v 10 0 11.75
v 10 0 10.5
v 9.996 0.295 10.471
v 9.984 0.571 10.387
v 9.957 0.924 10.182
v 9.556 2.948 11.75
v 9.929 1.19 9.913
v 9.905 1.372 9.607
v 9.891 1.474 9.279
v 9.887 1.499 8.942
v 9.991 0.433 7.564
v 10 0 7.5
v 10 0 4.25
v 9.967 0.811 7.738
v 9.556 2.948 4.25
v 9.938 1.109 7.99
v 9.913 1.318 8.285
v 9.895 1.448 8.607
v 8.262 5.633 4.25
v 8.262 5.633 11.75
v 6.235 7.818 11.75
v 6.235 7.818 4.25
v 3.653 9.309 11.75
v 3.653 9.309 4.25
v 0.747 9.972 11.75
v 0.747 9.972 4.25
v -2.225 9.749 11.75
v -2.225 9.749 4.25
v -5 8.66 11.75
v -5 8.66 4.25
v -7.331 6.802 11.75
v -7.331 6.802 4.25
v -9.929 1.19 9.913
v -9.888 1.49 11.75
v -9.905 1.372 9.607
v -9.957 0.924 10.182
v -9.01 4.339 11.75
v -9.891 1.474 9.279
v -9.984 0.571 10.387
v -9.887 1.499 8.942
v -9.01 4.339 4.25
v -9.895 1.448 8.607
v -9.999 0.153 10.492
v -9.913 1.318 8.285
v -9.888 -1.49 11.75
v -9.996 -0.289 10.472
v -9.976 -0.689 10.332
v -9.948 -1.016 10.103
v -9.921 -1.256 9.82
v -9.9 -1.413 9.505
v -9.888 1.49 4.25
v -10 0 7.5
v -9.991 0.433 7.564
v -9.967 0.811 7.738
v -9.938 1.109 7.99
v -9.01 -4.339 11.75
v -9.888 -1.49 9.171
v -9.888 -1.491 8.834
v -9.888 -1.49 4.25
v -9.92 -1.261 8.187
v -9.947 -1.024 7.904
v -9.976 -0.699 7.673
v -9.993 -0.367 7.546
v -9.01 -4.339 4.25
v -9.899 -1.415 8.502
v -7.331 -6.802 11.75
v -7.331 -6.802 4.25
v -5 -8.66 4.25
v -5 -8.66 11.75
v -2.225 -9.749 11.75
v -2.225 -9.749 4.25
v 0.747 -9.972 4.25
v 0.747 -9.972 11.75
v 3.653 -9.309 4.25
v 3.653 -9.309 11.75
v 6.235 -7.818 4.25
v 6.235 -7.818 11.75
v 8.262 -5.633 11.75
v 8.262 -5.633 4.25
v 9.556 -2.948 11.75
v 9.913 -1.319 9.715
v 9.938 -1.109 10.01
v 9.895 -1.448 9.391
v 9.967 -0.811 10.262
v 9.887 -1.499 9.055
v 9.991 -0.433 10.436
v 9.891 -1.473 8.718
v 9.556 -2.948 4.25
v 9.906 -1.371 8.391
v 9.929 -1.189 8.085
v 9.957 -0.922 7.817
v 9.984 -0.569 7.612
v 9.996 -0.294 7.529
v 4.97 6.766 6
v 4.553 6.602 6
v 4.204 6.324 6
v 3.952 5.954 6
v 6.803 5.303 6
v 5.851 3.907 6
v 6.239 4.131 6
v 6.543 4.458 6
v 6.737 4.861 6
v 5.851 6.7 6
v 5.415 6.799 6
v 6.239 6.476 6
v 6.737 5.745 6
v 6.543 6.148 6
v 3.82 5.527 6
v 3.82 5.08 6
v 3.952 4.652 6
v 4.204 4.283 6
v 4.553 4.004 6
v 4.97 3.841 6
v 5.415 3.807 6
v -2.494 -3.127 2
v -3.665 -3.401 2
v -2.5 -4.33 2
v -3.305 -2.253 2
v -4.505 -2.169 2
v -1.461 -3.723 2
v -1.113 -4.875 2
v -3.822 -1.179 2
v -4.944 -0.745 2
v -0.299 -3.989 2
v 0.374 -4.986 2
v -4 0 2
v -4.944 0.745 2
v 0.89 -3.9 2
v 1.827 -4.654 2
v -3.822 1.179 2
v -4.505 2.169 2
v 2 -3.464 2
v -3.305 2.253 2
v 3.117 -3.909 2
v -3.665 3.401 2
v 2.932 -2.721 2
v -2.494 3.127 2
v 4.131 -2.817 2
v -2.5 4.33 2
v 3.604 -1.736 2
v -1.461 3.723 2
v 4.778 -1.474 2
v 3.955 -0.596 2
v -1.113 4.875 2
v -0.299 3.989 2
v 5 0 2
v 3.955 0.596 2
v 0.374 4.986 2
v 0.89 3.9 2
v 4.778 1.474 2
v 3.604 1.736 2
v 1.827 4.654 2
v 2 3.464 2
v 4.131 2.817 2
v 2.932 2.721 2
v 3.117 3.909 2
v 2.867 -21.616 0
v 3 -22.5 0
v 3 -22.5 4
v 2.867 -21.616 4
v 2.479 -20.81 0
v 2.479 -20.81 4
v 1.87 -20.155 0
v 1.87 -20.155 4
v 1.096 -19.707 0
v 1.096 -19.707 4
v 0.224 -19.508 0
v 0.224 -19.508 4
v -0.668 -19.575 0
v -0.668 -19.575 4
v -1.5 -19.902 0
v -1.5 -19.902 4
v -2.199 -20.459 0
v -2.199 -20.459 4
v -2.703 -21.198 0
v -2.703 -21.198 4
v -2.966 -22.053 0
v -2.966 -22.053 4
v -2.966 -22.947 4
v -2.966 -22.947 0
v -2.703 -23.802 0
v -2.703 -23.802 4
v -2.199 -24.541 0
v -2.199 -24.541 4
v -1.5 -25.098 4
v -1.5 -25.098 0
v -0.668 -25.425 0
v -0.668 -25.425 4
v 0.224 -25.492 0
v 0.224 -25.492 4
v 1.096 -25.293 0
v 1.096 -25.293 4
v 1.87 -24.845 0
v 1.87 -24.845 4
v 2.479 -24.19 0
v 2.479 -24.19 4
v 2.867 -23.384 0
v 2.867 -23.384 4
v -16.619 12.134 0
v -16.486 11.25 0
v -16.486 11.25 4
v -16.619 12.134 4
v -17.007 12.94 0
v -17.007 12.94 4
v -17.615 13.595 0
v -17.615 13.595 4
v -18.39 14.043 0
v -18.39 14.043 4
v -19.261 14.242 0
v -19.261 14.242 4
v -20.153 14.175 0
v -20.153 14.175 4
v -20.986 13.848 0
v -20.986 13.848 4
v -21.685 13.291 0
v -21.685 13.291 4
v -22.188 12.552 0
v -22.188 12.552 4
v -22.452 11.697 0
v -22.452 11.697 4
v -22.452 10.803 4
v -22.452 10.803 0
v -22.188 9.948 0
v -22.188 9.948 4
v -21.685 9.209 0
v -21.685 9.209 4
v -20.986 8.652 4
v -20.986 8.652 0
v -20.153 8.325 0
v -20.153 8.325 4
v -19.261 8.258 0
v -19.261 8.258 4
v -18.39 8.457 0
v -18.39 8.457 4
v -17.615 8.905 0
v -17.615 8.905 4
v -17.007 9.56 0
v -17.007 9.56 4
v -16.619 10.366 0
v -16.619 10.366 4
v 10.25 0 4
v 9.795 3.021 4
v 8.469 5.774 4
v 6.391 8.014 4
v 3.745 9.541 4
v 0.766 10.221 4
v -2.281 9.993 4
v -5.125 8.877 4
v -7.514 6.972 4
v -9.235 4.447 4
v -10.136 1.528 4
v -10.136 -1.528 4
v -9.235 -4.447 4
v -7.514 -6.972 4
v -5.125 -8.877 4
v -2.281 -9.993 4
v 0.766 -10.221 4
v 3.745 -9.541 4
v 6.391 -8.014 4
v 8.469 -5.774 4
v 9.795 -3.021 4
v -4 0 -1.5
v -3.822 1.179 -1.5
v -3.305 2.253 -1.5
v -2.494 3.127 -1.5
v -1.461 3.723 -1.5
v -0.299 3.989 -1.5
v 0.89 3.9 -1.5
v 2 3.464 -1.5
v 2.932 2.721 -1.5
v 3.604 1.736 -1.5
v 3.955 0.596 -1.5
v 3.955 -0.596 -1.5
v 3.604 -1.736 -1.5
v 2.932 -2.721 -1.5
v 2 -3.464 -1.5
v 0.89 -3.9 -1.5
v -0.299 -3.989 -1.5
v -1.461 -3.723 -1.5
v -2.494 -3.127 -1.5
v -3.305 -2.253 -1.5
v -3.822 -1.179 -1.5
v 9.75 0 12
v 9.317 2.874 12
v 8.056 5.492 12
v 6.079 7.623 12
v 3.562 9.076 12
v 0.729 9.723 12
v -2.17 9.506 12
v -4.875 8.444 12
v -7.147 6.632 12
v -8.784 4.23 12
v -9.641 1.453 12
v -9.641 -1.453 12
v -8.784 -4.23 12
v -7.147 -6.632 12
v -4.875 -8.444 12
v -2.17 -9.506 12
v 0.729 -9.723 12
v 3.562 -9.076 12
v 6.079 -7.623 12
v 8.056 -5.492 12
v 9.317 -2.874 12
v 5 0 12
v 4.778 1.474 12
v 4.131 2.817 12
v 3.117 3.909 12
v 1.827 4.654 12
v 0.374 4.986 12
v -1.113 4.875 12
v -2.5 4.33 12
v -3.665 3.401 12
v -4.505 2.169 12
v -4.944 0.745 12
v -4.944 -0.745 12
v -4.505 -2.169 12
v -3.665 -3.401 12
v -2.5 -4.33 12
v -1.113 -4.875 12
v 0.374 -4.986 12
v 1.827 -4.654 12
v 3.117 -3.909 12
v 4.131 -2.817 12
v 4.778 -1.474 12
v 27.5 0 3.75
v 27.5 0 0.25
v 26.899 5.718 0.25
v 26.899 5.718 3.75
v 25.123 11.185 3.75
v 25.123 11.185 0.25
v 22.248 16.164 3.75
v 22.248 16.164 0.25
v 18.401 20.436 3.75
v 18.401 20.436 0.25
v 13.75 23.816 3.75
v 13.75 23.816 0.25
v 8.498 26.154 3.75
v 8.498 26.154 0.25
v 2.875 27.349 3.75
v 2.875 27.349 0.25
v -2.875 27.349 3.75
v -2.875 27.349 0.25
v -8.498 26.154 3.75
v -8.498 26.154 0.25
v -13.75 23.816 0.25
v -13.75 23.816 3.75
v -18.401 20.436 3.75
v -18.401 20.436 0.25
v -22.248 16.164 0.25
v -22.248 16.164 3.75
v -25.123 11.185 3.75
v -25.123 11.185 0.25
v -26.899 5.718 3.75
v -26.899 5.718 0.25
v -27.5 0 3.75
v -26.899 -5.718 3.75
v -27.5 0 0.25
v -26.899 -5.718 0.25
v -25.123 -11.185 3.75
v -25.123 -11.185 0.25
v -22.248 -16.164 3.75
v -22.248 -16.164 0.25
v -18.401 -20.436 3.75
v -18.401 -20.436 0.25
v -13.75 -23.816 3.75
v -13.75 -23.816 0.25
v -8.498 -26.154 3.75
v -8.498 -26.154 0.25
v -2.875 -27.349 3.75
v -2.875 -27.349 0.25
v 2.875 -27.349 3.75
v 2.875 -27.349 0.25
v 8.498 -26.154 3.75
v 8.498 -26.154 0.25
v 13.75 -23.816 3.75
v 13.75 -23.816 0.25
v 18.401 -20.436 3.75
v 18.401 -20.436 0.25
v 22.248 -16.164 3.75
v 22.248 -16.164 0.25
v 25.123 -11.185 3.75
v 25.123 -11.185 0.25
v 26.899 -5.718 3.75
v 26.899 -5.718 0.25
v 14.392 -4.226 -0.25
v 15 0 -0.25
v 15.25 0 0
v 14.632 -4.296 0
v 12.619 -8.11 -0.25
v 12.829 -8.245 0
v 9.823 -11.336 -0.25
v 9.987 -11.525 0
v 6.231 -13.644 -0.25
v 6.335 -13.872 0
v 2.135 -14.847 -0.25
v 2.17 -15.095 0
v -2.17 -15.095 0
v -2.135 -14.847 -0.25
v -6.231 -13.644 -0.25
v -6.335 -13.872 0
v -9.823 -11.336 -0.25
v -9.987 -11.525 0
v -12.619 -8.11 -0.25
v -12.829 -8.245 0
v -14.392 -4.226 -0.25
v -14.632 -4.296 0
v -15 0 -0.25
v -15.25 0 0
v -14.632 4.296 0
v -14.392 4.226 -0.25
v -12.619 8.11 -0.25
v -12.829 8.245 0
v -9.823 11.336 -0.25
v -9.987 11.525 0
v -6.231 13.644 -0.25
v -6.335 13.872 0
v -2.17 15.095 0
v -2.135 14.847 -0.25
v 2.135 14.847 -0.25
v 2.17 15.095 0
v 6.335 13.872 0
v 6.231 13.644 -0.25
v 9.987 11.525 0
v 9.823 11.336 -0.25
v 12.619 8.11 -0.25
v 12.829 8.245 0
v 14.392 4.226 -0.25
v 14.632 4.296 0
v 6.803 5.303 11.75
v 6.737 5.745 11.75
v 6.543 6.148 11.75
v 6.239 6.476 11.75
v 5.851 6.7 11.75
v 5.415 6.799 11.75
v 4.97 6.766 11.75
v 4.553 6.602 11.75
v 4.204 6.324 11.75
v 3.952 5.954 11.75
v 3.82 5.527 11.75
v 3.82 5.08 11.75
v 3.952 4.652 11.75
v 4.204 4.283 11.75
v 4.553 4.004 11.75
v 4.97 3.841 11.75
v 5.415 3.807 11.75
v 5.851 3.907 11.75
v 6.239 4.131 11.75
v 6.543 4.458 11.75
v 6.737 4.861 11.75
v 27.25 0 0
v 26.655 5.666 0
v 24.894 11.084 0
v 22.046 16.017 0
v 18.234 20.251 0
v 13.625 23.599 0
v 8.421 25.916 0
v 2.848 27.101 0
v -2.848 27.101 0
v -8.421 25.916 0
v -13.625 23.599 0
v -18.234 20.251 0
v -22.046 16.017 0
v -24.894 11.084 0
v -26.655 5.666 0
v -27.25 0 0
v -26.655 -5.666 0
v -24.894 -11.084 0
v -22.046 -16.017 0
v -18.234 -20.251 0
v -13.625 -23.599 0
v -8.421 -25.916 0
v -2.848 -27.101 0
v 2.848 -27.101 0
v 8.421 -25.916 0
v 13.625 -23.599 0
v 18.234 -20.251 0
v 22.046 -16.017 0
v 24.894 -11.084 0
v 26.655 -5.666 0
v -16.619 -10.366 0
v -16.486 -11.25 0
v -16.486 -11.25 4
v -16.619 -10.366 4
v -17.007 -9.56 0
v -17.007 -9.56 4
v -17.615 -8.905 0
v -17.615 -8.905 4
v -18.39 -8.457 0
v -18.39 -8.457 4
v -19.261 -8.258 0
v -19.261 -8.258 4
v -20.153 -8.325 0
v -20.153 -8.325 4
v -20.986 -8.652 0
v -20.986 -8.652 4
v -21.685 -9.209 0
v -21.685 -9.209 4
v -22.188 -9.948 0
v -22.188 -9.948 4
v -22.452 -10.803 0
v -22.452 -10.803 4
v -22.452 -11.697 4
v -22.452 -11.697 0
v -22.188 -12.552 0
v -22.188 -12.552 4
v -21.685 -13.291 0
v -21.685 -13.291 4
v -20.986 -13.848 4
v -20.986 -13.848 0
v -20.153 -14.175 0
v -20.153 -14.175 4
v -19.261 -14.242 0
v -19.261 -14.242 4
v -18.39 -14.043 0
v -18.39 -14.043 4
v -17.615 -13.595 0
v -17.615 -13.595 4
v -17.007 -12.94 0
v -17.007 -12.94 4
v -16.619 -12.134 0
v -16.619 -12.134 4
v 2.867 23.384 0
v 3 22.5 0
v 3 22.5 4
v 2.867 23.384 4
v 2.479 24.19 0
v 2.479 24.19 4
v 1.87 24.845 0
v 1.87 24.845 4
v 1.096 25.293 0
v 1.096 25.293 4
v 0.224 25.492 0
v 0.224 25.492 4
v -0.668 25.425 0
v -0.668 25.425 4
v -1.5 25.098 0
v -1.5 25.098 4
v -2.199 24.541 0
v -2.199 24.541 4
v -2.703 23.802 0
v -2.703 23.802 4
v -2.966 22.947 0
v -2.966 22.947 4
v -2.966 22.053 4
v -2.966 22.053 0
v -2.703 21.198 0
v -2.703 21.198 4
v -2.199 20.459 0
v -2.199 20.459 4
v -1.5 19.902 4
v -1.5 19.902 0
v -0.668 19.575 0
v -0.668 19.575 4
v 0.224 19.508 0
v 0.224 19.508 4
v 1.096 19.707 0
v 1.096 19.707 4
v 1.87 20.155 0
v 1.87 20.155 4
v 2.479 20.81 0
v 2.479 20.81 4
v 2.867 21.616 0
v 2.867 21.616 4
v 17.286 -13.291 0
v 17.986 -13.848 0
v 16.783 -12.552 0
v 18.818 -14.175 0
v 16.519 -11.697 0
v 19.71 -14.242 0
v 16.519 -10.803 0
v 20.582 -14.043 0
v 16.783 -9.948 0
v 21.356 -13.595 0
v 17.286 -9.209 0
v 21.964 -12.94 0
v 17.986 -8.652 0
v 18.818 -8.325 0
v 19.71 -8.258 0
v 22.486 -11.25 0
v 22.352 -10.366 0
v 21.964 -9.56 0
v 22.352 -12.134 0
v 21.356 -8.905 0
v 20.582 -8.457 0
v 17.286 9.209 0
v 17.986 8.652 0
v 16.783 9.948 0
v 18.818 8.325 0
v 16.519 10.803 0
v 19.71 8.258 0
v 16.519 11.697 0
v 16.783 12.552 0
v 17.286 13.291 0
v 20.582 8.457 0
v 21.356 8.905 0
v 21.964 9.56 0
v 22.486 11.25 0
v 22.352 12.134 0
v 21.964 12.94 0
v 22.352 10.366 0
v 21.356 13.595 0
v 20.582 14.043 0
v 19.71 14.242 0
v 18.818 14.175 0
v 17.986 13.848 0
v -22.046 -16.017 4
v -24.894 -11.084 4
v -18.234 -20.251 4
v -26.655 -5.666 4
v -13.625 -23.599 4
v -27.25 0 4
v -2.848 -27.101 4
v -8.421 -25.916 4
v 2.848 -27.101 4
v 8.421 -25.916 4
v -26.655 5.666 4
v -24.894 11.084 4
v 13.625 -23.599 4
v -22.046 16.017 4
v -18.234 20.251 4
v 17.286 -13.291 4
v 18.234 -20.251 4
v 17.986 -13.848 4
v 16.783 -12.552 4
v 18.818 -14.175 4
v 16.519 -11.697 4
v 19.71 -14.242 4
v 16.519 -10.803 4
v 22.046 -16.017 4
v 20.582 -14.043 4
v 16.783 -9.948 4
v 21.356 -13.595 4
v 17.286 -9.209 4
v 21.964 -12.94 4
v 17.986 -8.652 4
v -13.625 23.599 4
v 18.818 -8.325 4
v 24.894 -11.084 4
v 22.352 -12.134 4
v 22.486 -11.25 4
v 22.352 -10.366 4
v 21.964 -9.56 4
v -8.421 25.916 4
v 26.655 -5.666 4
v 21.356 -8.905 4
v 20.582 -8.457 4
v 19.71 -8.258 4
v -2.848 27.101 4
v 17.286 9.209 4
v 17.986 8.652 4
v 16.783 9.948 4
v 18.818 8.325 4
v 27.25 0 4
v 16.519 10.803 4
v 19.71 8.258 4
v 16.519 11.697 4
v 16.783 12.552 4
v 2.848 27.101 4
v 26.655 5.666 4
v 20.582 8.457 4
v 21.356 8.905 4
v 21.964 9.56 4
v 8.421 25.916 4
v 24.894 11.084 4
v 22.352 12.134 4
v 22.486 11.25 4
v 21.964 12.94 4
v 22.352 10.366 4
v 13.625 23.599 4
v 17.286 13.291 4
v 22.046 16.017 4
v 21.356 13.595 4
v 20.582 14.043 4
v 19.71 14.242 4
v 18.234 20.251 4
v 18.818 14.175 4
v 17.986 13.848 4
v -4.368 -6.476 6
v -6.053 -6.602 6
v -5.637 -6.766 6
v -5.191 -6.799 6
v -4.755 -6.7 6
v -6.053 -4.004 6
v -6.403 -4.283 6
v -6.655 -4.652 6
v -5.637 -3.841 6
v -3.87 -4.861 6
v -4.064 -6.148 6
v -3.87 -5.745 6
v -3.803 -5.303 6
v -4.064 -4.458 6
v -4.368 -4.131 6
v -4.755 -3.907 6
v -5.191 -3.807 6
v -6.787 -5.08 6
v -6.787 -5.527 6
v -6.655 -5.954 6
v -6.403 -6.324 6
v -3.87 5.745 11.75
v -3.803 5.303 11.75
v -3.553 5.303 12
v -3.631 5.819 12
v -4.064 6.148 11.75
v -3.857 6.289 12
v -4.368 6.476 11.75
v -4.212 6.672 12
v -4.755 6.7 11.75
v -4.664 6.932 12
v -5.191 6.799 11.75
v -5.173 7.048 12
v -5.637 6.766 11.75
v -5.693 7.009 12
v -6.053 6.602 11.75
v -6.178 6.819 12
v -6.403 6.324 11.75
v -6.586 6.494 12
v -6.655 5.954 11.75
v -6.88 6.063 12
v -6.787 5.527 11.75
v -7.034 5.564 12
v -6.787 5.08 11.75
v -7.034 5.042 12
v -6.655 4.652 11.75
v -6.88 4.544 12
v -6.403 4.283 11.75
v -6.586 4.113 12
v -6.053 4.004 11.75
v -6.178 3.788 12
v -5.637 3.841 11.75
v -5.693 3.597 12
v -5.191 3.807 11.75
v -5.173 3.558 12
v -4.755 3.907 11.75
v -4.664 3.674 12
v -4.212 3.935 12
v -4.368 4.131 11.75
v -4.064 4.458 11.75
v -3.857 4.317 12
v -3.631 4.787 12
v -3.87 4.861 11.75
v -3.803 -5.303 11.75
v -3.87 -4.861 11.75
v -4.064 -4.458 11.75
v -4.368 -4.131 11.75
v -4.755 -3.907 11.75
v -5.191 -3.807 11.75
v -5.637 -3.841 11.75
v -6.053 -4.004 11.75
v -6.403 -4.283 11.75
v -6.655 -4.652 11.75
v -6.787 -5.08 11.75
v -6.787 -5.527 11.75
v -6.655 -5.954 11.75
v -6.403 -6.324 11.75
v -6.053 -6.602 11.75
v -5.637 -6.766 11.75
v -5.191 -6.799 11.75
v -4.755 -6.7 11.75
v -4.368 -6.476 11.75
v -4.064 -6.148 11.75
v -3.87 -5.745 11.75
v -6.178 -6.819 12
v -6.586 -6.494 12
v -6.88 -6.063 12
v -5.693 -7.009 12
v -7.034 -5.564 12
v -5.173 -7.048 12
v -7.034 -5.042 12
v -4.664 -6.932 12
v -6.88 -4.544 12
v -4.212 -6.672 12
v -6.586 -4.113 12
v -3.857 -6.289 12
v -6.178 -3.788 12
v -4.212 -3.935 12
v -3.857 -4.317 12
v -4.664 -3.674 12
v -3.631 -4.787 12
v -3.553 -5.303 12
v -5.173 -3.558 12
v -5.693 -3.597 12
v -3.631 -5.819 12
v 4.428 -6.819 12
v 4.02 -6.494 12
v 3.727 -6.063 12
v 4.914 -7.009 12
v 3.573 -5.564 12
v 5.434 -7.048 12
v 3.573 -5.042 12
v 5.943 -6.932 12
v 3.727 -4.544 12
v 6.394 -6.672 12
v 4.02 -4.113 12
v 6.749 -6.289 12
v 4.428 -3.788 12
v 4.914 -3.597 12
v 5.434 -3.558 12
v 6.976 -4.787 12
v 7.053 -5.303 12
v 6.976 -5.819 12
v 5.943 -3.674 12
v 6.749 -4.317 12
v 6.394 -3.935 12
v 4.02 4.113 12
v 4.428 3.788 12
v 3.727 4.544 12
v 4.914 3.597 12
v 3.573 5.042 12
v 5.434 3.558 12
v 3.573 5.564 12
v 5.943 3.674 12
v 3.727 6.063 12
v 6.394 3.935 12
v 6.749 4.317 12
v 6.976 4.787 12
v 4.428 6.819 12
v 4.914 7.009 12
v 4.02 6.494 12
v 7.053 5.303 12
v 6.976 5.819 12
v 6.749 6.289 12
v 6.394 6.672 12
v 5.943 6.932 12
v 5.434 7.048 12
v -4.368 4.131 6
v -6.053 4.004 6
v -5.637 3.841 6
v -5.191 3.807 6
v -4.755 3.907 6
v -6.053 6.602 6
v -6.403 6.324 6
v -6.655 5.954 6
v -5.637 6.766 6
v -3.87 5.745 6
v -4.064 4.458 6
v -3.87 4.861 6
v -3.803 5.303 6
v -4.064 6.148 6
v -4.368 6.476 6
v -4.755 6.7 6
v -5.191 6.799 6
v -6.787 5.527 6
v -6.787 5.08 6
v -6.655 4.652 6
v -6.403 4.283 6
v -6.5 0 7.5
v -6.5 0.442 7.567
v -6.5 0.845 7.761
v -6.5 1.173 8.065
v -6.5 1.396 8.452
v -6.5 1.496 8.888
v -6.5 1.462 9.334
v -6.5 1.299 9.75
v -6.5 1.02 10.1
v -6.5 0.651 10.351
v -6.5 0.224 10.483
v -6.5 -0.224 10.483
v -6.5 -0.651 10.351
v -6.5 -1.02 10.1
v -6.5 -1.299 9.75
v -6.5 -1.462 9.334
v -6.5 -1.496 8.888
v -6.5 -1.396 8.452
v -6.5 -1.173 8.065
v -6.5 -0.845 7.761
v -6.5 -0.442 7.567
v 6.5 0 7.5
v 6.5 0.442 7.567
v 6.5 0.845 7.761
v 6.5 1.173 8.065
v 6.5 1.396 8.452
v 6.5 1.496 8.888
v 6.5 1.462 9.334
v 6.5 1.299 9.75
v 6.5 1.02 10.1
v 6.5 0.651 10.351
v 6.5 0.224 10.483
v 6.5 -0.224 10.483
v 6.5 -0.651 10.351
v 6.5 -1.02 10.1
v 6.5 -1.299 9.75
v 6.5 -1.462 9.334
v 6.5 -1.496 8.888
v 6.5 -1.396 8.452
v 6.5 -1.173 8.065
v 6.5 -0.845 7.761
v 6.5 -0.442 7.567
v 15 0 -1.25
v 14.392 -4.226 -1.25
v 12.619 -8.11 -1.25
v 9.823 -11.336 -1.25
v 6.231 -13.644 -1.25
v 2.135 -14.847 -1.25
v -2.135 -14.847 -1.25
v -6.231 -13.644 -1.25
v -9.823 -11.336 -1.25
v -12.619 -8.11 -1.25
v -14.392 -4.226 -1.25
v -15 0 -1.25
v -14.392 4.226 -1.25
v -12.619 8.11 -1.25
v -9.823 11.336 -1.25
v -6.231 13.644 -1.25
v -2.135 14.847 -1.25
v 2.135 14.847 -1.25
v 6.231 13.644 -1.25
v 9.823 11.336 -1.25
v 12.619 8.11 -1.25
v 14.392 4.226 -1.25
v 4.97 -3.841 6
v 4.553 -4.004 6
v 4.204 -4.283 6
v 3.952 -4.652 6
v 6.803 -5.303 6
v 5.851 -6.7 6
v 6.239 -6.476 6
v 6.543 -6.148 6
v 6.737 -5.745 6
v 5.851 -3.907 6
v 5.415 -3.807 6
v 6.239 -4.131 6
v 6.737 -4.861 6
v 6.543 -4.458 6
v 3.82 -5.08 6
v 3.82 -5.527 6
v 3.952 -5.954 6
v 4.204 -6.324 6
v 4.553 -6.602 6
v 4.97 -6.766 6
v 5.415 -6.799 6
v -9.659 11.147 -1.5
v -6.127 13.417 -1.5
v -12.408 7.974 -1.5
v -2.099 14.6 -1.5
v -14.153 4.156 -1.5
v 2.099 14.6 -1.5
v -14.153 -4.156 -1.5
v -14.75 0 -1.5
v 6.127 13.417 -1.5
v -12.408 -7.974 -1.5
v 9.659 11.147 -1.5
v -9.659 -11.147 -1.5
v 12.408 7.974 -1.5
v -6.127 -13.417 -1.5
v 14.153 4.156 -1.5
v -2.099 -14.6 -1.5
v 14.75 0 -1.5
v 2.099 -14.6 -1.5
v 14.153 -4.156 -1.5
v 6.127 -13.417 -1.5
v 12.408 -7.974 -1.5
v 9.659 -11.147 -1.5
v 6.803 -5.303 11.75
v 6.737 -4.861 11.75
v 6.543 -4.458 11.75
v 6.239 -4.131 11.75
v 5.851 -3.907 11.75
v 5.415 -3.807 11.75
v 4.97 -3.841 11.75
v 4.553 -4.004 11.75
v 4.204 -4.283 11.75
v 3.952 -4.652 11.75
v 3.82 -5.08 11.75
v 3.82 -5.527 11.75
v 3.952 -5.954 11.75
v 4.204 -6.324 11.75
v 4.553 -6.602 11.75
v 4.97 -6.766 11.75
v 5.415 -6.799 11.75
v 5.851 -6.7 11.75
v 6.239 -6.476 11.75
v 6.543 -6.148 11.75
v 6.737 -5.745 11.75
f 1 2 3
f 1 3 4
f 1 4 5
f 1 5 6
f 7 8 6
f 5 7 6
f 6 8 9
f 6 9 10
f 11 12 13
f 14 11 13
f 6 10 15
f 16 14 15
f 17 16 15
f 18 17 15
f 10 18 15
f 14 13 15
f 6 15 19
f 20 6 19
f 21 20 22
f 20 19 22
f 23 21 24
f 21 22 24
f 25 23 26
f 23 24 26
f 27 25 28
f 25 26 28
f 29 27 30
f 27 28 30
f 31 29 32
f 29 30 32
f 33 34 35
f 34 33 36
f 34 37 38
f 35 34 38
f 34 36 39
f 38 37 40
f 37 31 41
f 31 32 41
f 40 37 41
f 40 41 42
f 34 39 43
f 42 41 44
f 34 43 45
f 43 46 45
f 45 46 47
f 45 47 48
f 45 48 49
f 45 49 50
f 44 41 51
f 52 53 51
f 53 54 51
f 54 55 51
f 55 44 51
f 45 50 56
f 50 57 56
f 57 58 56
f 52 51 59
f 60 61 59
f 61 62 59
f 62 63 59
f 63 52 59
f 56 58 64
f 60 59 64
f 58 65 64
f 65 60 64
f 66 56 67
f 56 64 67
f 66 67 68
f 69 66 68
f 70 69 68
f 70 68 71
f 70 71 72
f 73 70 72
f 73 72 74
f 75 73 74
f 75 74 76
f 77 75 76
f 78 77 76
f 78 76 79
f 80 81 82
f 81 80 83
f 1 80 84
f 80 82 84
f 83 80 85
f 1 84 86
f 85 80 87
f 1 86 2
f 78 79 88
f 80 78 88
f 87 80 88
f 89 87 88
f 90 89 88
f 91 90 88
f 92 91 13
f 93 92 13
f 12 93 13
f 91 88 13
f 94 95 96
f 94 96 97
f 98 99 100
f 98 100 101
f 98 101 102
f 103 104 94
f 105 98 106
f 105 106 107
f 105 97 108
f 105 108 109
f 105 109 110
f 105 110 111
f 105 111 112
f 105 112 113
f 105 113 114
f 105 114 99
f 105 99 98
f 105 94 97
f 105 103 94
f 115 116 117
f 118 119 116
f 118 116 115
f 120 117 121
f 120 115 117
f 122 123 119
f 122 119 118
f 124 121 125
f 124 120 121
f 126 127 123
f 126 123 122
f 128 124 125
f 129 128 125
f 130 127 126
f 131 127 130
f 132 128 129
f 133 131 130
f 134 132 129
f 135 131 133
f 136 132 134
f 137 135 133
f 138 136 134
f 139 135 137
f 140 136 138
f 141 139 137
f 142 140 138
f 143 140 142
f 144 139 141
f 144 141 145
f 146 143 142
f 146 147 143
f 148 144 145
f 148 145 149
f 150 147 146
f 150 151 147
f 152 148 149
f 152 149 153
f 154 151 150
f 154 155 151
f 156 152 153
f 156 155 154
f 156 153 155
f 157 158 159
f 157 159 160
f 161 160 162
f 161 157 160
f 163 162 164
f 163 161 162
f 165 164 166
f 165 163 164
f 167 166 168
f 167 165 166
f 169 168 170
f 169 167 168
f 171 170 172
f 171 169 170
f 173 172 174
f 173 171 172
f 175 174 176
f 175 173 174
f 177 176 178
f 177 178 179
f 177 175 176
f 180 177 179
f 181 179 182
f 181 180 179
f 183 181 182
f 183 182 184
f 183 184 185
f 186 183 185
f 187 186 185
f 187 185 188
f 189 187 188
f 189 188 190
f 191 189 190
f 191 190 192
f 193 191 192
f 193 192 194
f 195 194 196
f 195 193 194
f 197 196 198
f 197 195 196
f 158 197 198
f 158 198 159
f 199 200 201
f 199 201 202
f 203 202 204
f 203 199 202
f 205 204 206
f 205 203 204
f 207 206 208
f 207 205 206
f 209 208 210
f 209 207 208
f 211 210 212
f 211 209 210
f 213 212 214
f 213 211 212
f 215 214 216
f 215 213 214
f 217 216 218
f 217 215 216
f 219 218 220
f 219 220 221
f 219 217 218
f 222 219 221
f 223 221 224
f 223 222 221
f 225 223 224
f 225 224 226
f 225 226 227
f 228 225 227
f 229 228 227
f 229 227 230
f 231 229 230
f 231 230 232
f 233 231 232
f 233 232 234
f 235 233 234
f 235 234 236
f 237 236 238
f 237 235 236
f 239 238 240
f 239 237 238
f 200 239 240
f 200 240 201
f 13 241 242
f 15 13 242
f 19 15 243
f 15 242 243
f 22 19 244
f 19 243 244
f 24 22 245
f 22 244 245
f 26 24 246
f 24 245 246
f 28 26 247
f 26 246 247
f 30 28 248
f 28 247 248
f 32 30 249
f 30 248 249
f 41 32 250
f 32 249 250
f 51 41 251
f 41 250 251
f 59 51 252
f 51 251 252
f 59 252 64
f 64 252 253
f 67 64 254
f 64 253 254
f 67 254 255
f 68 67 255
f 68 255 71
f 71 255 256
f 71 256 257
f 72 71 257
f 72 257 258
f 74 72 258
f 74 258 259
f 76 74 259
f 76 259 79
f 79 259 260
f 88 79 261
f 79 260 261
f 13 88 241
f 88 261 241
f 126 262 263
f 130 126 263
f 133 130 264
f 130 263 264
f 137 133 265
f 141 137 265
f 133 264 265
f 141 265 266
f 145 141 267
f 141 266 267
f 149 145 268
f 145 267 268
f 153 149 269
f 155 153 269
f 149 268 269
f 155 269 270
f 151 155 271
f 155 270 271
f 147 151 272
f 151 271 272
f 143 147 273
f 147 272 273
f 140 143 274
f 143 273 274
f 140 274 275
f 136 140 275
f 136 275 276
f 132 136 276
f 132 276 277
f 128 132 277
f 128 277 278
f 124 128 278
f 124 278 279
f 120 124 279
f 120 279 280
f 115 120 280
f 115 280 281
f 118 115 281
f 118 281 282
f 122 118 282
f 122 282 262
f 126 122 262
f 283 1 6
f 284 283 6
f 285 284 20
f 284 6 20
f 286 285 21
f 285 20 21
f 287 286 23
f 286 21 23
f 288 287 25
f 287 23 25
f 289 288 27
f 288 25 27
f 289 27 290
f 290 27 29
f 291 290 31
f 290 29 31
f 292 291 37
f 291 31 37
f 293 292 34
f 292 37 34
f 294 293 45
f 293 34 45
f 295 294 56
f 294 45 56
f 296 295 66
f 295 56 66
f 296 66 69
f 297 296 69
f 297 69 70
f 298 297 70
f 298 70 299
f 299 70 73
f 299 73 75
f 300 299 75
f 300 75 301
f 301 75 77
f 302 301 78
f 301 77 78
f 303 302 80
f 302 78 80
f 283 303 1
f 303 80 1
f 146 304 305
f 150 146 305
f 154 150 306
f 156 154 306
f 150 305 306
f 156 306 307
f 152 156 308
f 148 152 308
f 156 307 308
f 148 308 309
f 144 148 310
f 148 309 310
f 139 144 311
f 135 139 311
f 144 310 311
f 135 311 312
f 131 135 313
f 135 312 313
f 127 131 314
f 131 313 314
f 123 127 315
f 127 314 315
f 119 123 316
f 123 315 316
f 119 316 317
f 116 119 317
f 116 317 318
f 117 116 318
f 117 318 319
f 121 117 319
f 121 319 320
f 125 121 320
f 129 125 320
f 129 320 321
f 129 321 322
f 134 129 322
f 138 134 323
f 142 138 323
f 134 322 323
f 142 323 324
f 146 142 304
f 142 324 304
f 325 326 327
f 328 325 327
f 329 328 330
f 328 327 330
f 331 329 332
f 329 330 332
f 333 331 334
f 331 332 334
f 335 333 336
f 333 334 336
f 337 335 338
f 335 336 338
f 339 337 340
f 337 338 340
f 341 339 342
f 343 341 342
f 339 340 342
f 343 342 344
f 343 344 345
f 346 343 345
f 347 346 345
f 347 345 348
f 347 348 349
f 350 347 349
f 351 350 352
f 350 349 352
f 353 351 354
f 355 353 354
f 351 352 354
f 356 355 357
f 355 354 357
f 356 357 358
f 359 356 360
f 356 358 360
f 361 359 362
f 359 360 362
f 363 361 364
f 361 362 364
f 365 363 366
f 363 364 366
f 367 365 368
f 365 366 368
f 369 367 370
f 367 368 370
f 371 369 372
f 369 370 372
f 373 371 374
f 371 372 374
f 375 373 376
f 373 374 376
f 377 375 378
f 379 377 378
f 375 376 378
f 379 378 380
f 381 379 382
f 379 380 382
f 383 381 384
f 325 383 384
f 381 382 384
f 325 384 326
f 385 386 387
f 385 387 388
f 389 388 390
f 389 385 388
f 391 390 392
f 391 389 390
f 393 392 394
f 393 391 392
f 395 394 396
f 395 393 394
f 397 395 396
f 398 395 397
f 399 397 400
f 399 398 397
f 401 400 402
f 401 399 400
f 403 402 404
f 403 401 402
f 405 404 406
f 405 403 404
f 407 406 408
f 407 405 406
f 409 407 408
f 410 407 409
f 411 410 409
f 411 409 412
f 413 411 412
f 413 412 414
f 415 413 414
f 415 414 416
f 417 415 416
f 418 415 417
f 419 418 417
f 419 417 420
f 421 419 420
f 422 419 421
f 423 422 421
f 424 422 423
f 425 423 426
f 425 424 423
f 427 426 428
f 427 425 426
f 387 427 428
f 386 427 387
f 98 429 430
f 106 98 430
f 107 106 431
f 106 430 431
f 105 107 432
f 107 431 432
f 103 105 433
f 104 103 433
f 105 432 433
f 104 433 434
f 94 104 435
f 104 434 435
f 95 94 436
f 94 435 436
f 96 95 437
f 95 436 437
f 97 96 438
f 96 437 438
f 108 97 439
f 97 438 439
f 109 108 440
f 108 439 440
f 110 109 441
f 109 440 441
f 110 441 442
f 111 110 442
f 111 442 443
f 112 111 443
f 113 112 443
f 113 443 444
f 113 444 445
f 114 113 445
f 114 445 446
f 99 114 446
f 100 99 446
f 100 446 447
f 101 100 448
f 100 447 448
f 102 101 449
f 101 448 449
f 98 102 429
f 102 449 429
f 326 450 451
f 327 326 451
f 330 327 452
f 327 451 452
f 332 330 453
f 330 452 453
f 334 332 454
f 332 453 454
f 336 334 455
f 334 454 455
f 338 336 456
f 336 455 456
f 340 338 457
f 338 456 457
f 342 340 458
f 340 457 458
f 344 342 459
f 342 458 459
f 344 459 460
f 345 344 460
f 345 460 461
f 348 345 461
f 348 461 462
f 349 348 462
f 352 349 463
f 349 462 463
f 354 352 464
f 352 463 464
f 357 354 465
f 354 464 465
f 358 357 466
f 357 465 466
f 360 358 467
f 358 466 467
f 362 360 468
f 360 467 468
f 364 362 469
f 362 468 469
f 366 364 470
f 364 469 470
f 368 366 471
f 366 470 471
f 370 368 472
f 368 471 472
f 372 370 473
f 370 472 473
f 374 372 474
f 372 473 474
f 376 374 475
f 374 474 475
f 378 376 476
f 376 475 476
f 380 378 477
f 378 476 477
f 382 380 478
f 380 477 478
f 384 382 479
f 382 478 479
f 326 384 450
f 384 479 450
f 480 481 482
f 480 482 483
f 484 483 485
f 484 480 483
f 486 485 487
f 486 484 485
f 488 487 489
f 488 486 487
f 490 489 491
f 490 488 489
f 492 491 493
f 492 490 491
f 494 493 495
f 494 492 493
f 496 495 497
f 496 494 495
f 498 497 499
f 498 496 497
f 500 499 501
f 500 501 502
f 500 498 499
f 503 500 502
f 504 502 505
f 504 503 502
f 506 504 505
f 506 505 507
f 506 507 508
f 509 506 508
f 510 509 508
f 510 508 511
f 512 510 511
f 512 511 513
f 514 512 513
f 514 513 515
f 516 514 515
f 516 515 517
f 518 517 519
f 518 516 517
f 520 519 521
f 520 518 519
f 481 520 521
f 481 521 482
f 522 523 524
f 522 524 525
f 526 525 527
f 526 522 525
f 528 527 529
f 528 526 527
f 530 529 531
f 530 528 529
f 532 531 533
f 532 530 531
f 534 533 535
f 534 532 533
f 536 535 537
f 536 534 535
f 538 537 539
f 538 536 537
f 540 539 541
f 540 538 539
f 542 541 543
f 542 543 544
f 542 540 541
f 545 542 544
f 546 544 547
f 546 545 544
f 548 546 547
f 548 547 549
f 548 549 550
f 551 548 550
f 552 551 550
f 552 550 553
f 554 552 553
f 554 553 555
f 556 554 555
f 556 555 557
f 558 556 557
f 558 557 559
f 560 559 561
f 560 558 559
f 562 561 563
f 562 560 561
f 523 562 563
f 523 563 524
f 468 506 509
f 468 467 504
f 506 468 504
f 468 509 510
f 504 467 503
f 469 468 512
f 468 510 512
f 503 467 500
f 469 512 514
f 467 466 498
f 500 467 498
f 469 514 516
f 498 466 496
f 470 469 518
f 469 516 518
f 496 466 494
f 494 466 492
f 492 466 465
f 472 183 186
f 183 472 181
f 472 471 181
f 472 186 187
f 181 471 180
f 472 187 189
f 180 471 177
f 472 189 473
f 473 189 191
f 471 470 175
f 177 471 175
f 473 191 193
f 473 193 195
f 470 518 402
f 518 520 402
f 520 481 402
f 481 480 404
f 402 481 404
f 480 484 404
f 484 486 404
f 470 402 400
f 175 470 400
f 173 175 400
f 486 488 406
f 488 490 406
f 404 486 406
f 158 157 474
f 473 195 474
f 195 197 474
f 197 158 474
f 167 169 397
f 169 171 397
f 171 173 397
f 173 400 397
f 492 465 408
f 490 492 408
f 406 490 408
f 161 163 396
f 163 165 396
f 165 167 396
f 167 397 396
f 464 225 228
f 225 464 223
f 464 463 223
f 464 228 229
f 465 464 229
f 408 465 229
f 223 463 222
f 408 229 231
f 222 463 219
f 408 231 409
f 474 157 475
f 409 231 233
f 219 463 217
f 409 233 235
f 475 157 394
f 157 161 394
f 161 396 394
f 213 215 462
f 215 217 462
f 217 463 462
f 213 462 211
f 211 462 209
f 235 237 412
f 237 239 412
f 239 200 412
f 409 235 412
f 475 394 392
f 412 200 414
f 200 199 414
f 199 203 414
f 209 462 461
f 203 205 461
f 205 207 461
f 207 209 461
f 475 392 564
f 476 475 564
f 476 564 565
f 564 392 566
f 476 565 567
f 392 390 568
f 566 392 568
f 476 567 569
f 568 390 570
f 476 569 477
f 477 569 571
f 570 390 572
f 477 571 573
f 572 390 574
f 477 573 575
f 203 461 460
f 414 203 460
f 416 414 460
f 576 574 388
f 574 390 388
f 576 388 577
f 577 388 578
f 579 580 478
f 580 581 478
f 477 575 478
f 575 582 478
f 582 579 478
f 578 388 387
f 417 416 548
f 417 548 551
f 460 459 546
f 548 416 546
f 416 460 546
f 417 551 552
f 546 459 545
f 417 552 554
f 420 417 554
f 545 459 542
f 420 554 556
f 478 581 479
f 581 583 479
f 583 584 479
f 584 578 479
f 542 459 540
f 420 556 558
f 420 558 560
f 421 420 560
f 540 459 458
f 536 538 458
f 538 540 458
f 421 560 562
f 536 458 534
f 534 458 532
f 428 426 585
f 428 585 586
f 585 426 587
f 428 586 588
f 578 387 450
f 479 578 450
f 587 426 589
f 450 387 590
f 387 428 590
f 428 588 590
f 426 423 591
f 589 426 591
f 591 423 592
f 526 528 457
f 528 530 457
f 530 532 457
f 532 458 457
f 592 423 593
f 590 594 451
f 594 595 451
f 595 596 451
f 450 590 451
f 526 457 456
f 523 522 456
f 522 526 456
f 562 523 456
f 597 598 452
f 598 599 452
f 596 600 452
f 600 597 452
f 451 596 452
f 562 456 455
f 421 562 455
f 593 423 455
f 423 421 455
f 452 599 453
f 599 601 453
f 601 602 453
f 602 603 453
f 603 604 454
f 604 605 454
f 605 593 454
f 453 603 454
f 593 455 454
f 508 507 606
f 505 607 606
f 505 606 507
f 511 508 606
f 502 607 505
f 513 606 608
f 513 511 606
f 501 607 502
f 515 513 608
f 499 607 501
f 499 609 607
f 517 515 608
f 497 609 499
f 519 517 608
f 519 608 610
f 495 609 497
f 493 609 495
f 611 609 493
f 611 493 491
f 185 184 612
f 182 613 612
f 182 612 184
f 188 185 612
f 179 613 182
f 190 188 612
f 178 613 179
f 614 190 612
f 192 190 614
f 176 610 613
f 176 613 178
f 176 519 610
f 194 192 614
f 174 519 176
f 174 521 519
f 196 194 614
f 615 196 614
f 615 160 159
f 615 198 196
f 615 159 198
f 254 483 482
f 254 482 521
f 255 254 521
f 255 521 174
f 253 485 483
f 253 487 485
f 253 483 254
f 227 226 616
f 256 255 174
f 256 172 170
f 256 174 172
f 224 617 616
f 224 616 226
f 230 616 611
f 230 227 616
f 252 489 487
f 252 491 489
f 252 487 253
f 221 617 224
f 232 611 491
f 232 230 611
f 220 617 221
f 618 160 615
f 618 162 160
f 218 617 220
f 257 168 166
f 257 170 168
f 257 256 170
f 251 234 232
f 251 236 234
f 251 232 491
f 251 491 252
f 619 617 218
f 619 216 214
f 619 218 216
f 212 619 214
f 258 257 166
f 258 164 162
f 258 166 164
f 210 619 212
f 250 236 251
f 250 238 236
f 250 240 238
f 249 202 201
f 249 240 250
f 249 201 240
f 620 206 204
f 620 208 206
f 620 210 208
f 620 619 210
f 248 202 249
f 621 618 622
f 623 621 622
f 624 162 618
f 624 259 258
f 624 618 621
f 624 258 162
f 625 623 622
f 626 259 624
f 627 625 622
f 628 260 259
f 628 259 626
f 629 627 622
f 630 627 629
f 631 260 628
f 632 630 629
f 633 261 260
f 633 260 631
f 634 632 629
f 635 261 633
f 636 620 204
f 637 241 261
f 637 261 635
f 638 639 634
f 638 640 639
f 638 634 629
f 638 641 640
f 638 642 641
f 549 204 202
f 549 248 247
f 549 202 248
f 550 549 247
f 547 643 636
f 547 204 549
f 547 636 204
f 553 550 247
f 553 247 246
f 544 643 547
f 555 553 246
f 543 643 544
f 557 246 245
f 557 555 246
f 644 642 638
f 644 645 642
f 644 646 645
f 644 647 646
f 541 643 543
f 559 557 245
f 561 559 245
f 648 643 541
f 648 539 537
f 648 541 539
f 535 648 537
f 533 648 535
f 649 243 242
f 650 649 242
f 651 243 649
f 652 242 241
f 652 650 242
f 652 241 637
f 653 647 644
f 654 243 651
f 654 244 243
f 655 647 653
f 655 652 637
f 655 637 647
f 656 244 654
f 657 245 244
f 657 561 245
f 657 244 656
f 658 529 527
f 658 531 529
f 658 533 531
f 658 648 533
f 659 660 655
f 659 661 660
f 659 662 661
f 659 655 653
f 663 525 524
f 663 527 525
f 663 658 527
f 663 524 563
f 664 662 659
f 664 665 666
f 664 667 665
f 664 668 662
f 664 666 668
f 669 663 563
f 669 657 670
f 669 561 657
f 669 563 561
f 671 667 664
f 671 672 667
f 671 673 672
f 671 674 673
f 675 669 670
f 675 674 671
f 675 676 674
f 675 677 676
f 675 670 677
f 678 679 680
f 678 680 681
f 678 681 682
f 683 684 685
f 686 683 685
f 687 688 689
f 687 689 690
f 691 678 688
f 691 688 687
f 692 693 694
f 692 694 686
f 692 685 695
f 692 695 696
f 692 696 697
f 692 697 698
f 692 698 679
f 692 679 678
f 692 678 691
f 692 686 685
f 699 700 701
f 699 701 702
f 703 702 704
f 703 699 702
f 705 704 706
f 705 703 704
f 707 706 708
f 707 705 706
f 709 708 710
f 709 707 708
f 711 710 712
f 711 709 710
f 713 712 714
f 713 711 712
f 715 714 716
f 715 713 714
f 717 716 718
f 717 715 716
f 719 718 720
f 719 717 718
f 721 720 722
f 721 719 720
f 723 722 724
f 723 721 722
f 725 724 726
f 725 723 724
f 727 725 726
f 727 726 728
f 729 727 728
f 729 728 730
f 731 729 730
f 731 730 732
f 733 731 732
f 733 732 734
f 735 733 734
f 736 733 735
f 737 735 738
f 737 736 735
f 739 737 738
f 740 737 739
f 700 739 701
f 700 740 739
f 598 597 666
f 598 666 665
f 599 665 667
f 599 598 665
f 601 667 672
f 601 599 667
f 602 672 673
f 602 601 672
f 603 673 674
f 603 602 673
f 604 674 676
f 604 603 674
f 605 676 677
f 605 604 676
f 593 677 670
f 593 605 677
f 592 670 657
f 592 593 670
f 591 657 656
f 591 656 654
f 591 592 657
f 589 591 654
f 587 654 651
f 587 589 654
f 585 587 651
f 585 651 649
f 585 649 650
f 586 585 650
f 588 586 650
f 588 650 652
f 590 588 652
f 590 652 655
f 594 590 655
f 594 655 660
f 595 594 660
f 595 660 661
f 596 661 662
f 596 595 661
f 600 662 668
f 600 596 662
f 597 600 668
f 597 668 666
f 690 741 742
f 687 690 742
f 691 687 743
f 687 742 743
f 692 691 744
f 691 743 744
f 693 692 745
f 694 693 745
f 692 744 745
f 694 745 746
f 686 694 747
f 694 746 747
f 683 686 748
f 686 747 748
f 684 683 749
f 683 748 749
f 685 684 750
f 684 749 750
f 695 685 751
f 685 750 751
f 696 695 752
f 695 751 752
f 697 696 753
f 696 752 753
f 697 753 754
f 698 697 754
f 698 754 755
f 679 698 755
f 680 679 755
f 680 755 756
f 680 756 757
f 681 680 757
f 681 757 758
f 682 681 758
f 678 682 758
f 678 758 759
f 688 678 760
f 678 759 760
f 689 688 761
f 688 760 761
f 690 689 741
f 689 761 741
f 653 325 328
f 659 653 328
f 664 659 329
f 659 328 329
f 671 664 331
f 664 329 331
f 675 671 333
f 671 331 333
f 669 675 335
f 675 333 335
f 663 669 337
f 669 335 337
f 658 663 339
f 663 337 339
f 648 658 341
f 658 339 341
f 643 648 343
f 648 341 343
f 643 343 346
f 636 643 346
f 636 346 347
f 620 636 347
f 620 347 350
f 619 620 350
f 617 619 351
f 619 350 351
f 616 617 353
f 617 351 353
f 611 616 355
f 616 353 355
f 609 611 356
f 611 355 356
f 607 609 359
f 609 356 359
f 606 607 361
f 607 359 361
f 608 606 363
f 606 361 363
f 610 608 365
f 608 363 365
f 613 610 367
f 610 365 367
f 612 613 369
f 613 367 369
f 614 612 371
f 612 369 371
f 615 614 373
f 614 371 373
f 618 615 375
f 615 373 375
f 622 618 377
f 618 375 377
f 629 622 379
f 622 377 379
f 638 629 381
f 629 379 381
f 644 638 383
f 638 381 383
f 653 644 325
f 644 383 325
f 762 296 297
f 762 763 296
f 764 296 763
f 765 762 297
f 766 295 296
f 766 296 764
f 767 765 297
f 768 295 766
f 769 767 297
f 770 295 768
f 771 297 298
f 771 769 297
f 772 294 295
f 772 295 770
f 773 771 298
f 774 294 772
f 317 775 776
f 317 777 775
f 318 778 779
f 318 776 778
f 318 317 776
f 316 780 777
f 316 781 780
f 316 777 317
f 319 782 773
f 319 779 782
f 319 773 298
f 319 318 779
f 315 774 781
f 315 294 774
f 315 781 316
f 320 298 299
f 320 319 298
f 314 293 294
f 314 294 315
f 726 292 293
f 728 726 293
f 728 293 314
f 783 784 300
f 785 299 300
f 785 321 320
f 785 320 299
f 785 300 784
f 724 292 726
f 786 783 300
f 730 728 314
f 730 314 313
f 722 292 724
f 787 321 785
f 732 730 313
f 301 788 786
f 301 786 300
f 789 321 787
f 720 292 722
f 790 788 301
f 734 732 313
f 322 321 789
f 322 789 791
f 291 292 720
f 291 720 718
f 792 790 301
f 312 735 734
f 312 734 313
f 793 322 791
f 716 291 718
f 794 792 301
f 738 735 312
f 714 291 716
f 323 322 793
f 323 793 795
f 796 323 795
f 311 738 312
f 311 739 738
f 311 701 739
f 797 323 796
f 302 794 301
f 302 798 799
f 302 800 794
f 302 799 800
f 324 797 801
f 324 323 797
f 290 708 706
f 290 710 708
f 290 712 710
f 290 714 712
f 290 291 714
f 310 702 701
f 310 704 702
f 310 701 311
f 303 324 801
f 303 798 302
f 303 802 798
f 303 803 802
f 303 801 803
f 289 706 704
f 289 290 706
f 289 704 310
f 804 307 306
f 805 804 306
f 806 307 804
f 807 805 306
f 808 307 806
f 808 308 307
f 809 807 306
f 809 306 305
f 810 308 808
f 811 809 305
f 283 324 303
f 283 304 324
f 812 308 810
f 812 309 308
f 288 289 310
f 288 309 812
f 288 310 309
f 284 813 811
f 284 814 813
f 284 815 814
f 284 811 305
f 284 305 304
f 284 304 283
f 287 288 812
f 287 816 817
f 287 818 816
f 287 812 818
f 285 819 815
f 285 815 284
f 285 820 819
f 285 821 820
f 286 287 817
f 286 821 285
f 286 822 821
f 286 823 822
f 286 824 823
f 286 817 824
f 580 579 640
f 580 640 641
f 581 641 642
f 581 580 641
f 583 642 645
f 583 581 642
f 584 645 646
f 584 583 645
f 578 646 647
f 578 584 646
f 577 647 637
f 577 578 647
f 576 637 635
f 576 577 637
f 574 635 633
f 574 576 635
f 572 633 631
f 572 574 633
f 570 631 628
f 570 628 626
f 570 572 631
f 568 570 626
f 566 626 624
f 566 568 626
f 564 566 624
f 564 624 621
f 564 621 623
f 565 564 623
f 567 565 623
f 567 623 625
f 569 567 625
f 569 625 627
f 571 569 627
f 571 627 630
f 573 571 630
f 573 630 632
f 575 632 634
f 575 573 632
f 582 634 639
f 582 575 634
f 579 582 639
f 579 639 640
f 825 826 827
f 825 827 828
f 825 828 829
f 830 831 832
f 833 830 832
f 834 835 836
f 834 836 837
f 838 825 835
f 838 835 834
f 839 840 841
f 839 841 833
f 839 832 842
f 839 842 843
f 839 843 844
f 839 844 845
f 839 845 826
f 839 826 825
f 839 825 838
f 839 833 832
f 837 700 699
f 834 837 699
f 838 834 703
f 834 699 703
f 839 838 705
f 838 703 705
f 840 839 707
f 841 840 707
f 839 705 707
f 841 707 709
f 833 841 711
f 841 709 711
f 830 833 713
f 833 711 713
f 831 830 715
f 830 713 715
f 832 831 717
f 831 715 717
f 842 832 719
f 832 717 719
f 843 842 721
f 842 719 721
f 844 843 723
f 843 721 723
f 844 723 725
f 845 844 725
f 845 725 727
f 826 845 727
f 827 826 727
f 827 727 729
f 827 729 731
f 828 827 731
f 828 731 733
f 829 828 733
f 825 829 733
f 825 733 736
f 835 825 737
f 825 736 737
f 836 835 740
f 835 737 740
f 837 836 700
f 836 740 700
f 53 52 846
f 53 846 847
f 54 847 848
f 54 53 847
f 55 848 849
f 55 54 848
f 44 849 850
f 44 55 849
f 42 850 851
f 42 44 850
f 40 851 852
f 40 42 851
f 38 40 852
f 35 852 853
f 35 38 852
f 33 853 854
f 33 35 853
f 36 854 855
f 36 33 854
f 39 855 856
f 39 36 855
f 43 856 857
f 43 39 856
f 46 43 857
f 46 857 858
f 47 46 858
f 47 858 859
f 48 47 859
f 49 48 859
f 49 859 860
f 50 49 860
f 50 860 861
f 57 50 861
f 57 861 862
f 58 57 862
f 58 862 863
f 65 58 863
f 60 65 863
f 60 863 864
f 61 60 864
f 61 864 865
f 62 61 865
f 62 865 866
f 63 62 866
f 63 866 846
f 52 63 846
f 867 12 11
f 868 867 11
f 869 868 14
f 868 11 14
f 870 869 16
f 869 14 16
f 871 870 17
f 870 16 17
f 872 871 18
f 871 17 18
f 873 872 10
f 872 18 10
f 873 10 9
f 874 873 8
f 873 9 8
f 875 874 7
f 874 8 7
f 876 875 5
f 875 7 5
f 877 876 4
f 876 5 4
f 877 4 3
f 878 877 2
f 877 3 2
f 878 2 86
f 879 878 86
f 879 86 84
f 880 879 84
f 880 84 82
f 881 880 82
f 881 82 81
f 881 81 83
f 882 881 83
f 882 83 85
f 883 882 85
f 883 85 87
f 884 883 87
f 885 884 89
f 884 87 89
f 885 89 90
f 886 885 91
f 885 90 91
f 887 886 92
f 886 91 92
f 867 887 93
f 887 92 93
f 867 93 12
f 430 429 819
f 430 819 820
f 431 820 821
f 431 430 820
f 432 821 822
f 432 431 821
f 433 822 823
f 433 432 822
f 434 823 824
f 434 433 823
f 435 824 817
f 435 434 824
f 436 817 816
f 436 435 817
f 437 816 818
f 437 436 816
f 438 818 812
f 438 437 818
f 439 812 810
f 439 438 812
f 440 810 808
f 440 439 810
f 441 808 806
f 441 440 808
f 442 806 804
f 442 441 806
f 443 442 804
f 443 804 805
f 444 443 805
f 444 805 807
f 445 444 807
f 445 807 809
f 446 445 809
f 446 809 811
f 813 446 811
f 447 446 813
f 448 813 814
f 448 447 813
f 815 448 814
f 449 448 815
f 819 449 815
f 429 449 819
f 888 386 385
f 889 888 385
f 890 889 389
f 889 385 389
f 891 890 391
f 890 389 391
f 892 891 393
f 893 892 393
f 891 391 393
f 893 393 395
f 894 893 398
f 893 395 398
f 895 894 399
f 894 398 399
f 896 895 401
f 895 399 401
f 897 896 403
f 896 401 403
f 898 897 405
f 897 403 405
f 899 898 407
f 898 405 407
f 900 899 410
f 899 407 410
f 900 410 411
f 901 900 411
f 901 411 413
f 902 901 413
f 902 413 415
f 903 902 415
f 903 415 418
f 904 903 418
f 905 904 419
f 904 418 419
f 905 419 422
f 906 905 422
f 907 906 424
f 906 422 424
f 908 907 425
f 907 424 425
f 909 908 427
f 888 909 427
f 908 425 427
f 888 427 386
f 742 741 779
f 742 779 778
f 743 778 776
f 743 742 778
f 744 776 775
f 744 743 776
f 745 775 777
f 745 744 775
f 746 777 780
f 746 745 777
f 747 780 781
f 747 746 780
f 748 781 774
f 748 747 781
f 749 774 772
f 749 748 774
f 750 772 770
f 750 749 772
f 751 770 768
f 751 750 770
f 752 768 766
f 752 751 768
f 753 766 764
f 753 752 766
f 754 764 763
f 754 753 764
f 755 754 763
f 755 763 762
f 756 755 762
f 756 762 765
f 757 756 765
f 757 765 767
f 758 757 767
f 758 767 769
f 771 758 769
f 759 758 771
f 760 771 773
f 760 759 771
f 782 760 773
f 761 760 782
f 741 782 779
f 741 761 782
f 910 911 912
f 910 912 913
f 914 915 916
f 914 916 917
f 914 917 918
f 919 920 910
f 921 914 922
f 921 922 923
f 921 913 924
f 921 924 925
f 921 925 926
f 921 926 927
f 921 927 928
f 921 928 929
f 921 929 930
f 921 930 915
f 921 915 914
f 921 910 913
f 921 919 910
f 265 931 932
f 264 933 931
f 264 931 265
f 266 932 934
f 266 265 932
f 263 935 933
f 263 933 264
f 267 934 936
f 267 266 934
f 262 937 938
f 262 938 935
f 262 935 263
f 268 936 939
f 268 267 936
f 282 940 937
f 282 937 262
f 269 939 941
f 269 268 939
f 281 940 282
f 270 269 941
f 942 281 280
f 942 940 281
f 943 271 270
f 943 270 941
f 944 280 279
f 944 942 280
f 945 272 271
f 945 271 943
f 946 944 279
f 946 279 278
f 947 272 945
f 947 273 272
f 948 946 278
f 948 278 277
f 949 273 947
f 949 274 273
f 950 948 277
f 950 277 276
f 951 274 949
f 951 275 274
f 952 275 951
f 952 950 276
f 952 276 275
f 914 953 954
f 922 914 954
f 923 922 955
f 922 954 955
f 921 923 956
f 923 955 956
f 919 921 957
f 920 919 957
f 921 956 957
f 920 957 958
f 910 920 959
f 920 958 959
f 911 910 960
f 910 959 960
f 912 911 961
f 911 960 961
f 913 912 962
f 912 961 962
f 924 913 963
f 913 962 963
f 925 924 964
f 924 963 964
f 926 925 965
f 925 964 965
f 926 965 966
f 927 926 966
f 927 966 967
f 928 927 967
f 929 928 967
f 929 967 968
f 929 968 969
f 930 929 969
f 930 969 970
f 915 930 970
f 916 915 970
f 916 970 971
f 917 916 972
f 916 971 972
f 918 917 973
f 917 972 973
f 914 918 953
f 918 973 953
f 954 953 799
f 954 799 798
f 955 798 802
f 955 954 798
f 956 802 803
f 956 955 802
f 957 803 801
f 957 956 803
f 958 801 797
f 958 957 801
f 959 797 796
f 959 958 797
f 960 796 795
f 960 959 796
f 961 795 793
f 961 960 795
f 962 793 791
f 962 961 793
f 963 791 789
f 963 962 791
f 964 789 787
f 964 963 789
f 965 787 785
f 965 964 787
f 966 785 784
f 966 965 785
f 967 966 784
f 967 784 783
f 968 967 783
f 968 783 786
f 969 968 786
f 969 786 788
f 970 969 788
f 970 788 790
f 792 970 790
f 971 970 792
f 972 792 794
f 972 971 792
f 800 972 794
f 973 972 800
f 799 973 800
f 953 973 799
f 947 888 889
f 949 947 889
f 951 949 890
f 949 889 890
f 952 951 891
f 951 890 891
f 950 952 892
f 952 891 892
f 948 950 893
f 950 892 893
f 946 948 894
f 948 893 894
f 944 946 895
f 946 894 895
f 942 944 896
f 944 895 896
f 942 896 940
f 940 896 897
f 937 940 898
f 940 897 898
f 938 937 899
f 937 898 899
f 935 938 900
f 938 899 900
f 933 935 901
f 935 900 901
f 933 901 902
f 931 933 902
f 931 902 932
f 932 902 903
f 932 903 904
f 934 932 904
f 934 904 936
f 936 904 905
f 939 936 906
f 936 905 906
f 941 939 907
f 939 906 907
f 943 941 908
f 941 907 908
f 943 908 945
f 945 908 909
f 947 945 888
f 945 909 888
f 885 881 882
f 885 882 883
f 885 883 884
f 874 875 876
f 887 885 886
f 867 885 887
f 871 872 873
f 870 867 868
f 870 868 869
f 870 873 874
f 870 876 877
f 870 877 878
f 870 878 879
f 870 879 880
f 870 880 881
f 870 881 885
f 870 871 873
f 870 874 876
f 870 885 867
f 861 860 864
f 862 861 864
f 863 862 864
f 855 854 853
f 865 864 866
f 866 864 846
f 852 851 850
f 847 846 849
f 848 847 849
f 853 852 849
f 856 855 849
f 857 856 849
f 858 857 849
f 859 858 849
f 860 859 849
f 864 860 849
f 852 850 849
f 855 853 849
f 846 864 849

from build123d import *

# Parameters (mm, degrees)
SKETCH1_R           = 27.5
SKETCH1_R_2         = 3
BOSS_EXTRUDE1_DEPTH = 4
SKETCH2_R           = 10
BOSS_EXTRUDE2_DEPTH = 8
SKETCH3_R           = 15
BOSS_EXTRUDE3_DEPTH = 1.5
SKETCH4_R           = 1.5
CUT_EXTRUDE2_DEPTH  = 6
CUT_EXTRUDE3_START  = 10
SKETCH5_R           = 1.5
CUT_EXTRUDE3_DEPTH  = 3.5
SKETCH6_R           = 5
CUT_EXTRUDE4_DEPTH  = 10
SKETCH7_R           = 4
CUT_EXTRUDE5_DEPTH  = 42.167341458
CHAMFER1_SIZE       = 0.25
CHAMFER2_SIZE       = 0.25


with BuildPart() as part:
    # Sketch1 → Boss-Extrude1 (new body)
    with BuildSketch(Plane.XY):
        Circle(SKETCH1_R)
        with Locations((0, 22.5)):
            Circle(SKETCH1_R_2, mode=Mode.SUBTRACT)
        with Locations((19.485571585, 11.25)):
            Circle(SKETCH1_R_2, mode=Mode.SUBTRACT)
        with Locations((19.485571585, -11.25)):
            Circle(SKETCH1_R_2, mode=Mode.SUBTRACT)
        with Locations((0, -22.5)):
            Circle(SKETCH1_R_2, mode=Mode.SUBTRACT)
        with Locations((-19.485571585, -11.25)):
            Circle(SKETCH1_R_2, mode=Mode.SUBTRACT)
        with Locations((-19.485571585, 11.25)):
            Circle(SKETCH1_R_2, mode=Mode.SUBTRACT)
    extrude(amount=BOSS_EXTRUDE1_DEPTH)

    # Sketch2 → Boss-Extrude2 (add)
    with BuildSketch(Plane.XY.offset(4)):
        Circle(SKETCH2_R)
    extrude(amount=BOSS_EXTRUDE2_DEPTH)

    # Sketch3 → Boss-Extrude3 (add)
    with BuildSketch(Plane(origin=(0, 0, 0), x_dir=(-1, 0, 0), z_dir=(0, 0, -1))):
        with Locations(Location((0, 0, 0), (0, 0, 180))):
            Circle(SKETCH3_R)
    extrude(amount=BOSS_EXTRUDE3_DEPTH)

    # Sketch4 → Cut-Extrude2 (cut)
    with BuildSketch(Plane.XY.offset(12)):
        with Locations((-5.303300859, 5.303300859)):
            Circle(SKETCH4_R)
        with Locations((5.303300859, 5.303300859)):
            Circle(SKETCH4_R)
        with Locations((5.303300859, -5.303300859)):
            Circle(SKETCH4_R)
        with Locations((-5.303300859, -5.303300859)):
            Circle(SKETCH4_R)
    extrude(amount=-CUT_EXTRUDE2_DEPTH, mode=Mode.SUBTRACT)

    # Sketch5 → Cut-Extrude3 (cut)
    with BuildSketch(Plane(origin=(0, 0, 0), x_dir=(0, 0, -1), z_dir=(1, 0, 0)).offset(CUT_EXTRUDE3_START)):
        with Locations((-9, 0)):
            Circle(SKETCH5_R)
    cut_extrude3 = extrude(amount=-CUT_EXTRUDE3_DEPTH, mode=Mode.SUBTRACT)

    # Mirror1: Cut-Extrude3 across plane
    add(cut_extrude3.mirror(Plane(origin=(0, 0, 0), x_dir=(0, 0, 1), z_dir=(1, 0, 0))), mode=Mode.SUBTRACT)

    # Sketch6 → Cut-Extrude4 (cut)
    with BuildSketch(Plane.XY.offset(12)):
        Circle(SKETCH6_R)
    extrude(amount=-CUT_EXTRUDE4_DEPTH, mode=Mode.SUBTRACT)

    # Sketch7 → Cut-Extrude5 (cut, through all)
    with BuildSketch(Plane(origin=(0, 0, -1.5), x_dir=(-1, 0, 0), z_dir=(0, 0, -1))):
        Circle(SKETCH7_R)
    extrude(amount=-CUT_EXTRUDE5_DEPTH, mode=Mode.SUBTRACT)

    # Chamfer1
    chamfer1_edges = [part.edges().sort_by_distance(p)[0] for p in [
        (-6.803300859, -5.303300859, 12),
        (3.803300859, -5.303300859, 12),
        (3.803300859, 5.303300859, 12),
        (-6.803300859, 5.303300859, 12),
    ]]
    chamfer(chamfer1_edges, length=CHAMFER1_SIZE)

    # Chamfer2
    chamfer2_edges = [part.edges().sort_by_distance(p)[0] for p in [
        (-27.5, 0, 0),
        (-10, 0, 4),
        (-10, 0, 12),
        (-15, 0, 0),
        (-15, 0, -1.5),
        (-27.5, 0, 4),
    ]]
    chamfer(chamfer2_edges, length=CHAMFER2_SIZE)


solid = part.part
